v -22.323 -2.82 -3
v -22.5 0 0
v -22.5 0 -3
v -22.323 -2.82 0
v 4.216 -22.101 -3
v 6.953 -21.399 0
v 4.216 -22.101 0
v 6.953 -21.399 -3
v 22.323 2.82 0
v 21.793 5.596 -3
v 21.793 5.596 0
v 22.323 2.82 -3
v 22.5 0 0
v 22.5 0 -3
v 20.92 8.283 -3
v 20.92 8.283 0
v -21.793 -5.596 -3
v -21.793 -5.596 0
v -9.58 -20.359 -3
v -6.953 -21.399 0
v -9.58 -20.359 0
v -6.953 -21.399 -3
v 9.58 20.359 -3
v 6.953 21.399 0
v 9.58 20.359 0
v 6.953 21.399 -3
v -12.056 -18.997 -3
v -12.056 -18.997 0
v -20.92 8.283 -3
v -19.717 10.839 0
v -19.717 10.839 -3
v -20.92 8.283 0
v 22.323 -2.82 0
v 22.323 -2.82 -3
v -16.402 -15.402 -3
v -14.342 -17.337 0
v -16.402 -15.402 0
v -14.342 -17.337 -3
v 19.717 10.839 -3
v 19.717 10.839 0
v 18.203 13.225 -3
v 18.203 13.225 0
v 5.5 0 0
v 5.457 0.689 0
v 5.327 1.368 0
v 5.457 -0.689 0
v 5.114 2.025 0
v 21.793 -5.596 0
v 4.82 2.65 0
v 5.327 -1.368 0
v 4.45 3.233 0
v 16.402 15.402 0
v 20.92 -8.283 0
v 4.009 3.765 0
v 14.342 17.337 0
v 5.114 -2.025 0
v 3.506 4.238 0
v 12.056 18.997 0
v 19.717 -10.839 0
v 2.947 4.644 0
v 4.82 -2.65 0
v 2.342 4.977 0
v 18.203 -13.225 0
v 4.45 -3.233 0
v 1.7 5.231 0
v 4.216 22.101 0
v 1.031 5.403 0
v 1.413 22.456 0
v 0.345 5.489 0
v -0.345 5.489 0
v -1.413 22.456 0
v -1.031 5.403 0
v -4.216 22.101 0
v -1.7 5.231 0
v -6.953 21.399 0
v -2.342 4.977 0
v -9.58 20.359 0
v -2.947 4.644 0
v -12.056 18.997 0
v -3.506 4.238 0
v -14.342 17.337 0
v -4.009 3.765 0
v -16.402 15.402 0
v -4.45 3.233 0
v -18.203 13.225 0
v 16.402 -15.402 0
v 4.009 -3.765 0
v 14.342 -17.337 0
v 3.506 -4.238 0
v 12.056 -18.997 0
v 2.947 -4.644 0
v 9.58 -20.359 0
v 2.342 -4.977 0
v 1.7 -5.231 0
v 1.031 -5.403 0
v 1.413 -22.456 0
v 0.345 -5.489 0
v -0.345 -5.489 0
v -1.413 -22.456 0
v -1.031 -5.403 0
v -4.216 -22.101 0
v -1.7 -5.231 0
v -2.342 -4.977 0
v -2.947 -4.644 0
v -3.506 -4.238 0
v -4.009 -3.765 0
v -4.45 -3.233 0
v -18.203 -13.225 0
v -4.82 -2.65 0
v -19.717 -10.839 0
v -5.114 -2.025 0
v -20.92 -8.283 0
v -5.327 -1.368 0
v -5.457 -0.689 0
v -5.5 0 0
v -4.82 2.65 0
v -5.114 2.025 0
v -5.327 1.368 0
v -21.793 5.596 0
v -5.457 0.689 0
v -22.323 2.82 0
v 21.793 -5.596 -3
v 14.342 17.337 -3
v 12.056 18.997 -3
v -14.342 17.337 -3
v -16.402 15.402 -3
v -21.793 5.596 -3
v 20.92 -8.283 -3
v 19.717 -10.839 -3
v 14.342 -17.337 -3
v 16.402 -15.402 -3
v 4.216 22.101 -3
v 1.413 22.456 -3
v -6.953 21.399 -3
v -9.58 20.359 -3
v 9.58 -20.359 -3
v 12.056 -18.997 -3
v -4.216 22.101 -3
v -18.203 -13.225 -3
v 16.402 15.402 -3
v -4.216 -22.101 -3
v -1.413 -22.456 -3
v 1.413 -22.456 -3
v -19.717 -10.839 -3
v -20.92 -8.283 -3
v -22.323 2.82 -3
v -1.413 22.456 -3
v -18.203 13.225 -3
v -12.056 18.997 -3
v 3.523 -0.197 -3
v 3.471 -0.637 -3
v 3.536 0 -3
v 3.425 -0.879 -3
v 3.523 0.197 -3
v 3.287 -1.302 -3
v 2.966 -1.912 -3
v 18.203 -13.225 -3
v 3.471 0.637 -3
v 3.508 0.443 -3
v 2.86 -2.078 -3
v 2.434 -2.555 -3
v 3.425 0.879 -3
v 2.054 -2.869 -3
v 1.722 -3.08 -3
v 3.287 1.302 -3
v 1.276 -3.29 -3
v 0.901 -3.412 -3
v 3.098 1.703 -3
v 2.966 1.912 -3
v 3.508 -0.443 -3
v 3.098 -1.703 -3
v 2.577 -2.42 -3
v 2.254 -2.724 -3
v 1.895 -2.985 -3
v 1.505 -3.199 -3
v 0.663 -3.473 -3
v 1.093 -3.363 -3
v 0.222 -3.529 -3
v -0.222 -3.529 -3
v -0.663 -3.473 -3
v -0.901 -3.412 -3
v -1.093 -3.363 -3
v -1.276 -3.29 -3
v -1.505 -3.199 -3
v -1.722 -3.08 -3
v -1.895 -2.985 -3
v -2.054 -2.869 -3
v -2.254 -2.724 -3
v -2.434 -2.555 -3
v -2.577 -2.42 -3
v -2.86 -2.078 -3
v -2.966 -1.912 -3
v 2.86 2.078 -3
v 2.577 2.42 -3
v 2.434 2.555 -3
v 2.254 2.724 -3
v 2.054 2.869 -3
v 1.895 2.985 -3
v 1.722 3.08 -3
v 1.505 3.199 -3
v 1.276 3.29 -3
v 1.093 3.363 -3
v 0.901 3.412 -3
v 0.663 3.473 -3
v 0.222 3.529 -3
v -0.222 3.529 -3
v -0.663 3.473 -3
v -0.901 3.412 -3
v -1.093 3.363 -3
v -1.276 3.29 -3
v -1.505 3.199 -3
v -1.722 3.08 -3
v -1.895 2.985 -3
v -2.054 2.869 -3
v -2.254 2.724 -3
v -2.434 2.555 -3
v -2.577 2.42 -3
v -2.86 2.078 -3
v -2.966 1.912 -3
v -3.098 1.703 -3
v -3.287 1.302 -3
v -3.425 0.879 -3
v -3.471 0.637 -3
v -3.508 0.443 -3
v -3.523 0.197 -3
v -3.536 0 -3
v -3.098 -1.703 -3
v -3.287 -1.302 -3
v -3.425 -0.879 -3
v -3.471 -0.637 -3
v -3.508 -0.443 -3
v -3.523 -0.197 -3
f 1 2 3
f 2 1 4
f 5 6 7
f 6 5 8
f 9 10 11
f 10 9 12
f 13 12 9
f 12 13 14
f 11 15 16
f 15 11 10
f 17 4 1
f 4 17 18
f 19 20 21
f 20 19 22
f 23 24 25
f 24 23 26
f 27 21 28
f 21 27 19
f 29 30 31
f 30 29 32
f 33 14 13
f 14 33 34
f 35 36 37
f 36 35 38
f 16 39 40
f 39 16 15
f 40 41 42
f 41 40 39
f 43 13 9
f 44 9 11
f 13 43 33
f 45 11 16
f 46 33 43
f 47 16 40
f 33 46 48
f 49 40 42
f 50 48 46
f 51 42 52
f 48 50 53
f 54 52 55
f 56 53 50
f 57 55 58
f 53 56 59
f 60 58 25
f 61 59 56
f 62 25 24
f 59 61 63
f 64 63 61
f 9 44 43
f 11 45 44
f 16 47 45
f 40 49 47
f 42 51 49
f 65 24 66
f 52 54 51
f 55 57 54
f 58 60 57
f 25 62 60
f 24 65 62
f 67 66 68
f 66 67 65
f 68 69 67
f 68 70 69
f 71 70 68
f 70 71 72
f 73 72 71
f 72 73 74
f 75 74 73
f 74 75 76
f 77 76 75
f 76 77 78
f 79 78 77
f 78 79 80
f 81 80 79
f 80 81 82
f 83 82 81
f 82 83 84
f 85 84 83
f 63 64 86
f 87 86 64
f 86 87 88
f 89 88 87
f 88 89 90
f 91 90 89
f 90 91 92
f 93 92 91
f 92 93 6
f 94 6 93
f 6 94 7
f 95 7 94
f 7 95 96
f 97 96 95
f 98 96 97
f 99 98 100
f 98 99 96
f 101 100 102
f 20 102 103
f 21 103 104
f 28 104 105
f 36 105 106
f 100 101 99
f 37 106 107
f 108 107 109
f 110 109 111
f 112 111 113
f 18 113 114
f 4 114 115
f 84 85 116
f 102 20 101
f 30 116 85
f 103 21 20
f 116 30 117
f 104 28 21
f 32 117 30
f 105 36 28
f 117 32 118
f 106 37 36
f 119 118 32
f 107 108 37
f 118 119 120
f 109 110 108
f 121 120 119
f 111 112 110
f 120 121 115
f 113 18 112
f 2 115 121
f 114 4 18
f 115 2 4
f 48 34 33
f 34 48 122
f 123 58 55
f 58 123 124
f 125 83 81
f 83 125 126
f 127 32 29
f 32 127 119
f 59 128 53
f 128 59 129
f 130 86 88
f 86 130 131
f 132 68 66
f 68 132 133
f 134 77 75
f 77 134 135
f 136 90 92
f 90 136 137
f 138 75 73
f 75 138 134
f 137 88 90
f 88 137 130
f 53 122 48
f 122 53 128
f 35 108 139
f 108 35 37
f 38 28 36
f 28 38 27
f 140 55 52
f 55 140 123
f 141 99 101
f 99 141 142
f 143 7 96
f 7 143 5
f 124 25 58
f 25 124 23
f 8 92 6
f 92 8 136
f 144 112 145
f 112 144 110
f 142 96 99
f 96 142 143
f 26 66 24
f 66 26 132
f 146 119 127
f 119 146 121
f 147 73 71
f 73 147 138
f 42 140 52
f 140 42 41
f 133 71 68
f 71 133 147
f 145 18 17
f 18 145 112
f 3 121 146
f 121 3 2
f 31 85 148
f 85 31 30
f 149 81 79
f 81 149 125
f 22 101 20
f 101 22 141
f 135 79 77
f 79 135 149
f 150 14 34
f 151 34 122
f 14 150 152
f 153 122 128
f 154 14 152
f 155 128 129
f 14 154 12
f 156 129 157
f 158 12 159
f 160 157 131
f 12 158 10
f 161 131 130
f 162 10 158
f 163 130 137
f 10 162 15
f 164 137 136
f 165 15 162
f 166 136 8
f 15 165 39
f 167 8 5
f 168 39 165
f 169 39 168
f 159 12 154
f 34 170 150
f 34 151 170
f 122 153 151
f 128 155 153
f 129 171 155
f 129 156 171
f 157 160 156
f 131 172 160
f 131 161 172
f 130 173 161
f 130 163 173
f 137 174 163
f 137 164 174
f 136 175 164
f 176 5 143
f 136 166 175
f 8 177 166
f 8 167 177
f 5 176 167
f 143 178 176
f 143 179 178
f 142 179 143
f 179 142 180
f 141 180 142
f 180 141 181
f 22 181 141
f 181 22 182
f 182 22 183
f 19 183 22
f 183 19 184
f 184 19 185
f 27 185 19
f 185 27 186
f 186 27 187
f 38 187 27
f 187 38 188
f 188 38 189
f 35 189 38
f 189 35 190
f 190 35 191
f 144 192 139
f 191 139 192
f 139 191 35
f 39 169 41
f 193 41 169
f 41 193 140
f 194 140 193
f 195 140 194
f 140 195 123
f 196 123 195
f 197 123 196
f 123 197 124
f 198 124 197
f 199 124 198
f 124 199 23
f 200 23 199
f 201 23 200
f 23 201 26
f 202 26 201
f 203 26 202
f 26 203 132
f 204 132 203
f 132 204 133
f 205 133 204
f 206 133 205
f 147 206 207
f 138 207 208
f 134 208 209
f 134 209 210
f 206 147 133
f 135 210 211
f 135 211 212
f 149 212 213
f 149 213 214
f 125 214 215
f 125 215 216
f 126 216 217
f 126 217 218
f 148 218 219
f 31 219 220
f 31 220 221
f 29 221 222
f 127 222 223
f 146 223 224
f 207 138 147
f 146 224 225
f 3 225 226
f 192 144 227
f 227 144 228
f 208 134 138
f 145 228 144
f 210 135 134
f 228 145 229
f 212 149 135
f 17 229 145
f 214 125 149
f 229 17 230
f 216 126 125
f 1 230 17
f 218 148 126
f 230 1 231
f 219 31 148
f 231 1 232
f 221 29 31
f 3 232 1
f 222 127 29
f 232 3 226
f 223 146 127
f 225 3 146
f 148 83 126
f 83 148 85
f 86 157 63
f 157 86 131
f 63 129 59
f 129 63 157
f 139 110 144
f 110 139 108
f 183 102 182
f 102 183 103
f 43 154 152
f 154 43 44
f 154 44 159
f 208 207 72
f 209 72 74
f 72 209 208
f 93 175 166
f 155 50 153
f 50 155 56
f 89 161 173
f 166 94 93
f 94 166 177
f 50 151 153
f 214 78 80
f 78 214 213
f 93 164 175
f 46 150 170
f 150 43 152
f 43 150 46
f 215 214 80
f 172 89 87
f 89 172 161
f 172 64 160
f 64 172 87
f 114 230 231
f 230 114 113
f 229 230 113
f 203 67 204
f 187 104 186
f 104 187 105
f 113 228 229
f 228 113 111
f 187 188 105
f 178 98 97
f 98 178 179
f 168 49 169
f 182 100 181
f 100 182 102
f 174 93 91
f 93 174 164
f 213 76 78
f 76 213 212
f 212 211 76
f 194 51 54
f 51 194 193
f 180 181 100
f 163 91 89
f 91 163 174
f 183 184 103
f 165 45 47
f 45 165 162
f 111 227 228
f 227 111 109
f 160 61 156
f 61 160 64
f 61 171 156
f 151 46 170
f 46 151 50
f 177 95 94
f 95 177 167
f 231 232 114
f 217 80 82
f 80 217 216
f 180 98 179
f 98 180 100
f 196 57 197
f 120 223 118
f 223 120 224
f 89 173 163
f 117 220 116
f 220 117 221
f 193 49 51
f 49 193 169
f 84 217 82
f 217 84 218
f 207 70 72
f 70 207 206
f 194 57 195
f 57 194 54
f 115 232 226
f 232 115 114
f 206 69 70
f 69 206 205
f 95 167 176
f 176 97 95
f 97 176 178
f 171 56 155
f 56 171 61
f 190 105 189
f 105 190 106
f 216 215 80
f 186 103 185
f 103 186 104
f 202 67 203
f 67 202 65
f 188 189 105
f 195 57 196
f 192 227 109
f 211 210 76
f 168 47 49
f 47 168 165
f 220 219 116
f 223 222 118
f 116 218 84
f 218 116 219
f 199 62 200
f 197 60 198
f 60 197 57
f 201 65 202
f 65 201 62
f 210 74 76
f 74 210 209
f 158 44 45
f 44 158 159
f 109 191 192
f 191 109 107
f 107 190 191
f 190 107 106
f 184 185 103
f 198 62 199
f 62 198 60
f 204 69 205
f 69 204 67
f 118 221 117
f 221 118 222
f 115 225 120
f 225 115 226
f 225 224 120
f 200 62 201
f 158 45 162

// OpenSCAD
$fn = 50;


difference() {
	union() {
		translate(v = [0, 0, -3.0000000000]) {
			cylinder(h = 3, r = 22.5000000000);
		}
		translate(v = [0, 0, -3.0000000000]) {
			cylinder(h = 3, r = 2.8750000000);
		}
	}
	union() {
		translate(v = [0, 0, 0]) {
			rotate(a = [0, 0, 0]) {
				difference() {
					union() {
						translate(v = [0, 0, -3.0000000000]) {
							cylinder(h = 3, r = 2.2500000000);
						}
						translate(v = [0, 0, -4.2000000000]) {
							cylinder(h = 4.2000000000, r1 = 2.7500000000, r2 = 5.5000000000);
						}
						translate(v = [0, 0, -3.0000000000]) {
							cylinder(h = 3, r = 2.7500000000);
						}
						translate(v = [0, 0, -3.0000000000]) {
							cylinder(h = 3, r = 2.2500000000);
						}
					}
					union();
				}
			}
		}
	}
}
